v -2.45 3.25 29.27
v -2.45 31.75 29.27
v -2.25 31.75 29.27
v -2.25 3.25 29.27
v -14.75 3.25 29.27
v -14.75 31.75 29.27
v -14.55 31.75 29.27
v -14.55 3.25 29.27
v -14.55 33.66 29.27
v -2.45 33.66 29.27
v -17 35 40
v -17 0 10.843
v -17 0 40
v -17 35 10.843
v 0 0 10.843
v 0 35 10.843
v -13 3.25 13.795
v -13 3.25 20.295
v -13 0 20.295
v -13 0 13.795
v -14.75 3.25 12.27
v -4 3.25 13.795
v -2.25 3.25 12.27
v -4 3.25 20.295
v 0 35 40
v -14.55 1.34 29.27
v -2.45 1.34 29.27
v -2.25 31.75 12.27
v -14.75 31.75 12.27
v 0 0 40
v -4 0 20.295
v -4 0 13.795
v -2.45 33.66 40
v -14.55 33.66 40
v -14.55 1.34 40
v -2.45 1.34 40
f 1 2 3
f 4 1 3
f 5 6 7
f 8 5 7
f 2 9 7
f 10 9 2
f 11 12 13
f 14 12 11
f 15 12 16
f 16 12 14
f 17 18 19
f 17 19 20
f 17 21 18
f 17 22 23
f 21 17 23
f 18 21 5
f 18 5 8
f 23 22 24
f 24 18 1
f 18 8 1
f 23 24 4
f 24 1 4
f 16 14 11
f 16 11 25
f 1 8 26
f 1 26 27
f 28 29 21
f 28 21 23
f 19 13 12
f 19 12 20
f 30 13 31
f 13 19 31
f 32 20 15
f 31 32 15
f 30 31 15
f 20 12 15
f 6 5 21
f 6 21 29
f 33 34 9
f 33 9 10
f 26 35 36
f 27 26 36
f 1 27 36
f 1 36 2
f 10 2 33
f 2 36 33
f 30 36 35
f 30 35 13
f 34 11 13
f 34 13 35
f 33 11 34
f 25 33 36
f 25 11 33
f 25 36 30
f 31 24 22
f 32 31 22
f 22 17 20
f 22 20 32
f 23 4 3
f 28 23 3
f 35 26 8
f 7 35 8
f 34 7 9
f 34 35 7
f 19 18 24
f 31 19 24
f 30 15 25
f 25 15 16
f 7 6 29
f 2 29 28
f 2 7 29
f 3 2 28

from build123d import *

# Parameters (mm, degrees)
SKETCH2_W           = 17
SKETCH2_H           = 35
BOSS_EXTRUDE1_DEPTH = 40
SKETCH3_W           = 12.1
SKETCH3_H           = 32.32
CUT_EXTRUDE1_DEPTH  = 10.73
SKETCH4_W           = 12.5
SKETCH4_H           = 28.5
CUT_EXTRUDE2_DEPTH  = 17
SKETCH6_W           = 9
SKETCH6_H           = 6.5
CUT_EXTRUDE3_DEPTH  = 17
SKETCH7_W           = 10.843475329
SKETCH7_H           = 35
CUT_EXTRUDE4_DEPTH  = 56.803225713


with BuildPart() as part:
    # Sketch2 → Boss-Extrude1 (new body)
    with BuildSketch(Plane.XY):
        with Locations((-8.5, 17.5)):
            Rectangle(SKETCH2_W, SKETCH2_H)
    extrude(amount=BOSS_EXTRUDE1_DEPTH)

    # Sketch3 → Cut-Extrude1 (cut)
    with BuildSketch(Plane.XY.offset(40)):
        with Locations((-8.5, 17.5)):
            Rectangle(SKETCH3_W, SKETCH3_H)
    extrude(amount=-CUT_EXTRUDE1_DEPTH, mode=Mode.SUBTRACT)

    # Sketch4 → Cut-Extrude2 (cut)
    with BuildSketch(Plane.XY.offset(29.27)):
        with Locations((-8.5, 17.5)):
            Rectangle(SKETCH4_W, SKETCH4_H)
    extrude(amount=-CUT_EXTRUDE2_DEPTH, mode=Mode.SUBTRACT)

    # Sketch6 → Cut-Extrude3 (cut)
    with BuildSketch(Plane(origin=(0, 3.25, 0), x_dir=(1, 0, 0), z_dir=(0, 1, 0))):
        with Locations((-8.5, -17.044771265)):
            Rectangle(SKETCH6_W, SKETCH6_H)
    extrude(amount=-CUT_EXTRUDE3_DEPTH, mode=Mode.SUBTRACT)

    # Sketch7 → Cut-Extrude4 (cut, through all)
    with BuildSketch(Plane.ZY.offset(17)):
        with Locations((5.421737665, 17.5)):
            Rectangle(SKETCH7_W, SKETCH7_H)
    extrude(amount=-CUT_EXTRUDE4_DEPTH, mode=Mode.SUBTRACT)


solid = part.part
